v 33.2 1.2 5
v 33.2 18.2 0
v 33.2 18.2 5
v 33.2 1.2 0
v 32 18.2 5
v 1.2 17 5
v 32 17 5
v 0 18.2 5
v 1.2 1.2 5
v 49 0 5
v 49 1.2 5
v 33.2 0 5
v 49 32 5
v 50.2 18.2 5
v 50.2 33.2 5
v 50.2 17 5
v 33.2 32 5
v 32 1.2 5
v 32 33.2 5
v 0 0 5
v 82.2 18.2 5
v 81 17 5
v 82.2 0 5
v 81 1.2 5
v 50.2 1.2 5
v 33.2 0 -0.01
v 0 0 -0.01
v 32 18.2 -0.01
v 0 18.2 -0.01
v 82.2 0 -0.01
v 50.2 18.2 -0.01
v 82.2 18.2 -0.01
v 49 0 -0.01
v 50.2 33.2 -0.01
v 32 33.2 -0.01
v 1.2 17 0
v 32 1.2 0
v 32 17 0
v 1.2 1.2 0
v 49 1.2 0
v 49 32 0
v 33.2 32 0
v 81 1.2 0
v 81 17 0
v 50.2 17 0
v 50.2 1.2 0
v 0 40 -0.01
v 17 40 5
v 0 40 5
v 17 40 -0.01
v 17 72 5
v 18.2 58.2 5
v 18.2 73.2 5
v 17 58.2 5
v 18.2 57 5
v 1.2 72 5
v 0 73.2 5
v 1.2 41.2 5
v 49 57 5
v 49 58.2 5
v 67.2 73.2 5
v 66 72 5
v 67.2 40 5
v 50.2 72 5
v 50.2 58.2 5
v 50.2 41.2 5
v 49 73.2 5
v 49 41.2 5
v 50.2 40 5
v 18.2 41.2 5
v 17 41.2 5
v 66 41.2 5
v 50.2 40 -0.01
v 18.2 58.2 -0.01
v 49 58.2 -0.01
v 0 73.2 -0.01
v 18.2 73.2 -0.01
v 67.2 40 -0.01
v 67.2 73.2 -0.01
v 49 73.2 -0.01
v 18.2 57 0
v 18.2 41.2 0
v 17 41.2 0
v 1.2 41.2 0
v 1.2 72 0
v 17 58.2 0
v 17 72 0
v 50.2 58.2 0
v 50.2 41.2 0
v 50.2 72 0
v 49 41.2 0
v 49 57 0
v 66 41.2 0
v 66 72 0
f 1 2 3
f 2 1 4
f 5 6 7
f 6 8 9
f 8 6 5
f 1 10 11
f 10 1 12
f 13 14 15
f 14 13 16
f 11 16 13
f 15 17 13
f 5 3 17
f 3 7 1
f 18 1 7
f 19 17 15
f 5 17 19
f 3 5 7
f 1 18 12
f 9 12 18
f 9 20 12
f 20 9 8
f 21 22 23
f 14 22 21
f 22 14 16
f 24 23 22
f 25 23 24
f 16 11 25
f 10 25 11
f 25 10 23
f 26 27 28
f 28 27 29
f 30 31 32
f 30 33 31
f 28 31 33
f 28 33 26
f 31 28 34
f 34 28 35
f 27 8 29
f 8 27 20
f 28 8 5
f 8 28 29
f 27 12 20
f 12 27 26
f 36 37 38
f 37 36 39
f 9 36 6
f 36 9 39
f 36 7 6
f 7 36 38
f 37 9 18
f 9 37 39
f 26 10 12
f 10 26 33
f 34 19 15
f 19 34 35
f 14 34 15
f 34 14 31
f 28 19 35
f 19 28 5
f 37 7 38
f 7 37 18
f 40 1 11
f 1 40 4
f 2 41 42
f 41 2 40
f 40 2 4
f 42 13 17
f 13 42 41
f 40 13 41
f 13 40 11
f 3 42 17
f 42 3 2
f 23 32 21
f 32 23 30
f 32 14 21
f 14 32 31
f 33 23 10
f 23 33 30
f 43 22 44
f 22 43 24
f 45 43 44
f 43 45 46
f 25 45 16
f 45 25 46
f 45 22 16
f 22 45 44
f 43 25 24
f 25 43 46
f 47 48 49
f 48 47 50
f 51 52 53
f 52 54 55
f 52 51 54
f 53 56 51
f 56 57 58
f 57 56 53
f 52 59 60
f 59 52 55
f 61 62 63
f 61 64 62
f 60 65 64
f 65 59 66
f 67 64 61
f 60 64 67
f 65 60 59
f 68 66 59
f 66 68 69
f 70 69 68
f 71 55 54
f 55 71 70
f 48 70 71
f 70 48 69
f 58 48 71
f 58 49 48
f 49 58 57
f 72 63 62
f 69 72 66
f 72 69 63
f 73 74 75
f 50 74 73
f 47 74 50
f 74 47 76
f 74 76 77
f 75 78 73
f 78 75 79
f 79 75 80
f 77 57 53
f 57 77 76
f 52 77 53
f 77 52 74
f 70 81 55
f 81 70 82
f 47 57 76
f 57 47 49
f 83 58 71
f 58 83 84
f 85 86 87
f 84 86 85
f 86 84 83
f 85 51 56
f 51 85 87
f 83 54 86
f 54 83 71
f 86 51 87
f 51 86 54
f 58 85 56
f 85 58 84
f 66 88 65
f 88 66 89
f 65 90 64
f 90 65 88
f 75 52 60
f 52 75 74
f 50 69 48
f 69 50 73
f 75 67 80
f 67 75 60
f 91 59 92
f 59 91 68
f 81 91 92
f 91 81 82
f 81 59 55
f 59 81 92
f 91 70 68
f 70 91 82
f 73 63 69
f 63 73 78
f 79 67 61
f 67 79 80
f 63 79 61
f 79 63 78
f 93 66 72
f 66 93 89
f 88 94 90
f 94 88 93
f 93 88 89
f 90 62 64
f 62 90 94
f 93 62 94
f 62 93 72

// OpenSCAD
// file: ../../Base/Boxes.scad
// Fischertechnik Box Foundation
// Pre-designed Boxes

use <Constants.scad>

include <PlacementOptions.scad>

box190Width = 190;
box190Depth = 130;
box130Width = 130;
box130Depth = 95;
boxUsageHeight = 33.9;
boxWallThickness = 2.4;
boxBaseThickness = 1.0;

// getBoxWallThickness()
// Gets the wall thickness of a Fischertechnik Box

function getBoxWallThickness() = boxWallThickness;

// Gets the usable height of a fischertechnik box
function getBoxUsageHeight() = boxUsageHeight;

// Gets the thickness of the Fischertechnik box base.
function getBoxBaseThickness() = boxBaseThickness;

// Gets the usable inner space of a Box 190 as an x/y-list
function getBox190Space() = [
    box190Width - 2*getBoxWallThickness(), 
    box190Depth - 2*getBoxWallThickness() ];

// Imports the Fischertechnik empty box 130x190 mm and places it at position 0,0
// 190x130 are the outer sizes, the inner space is slightly smaller. Use getBox190Space() to get the inner sizes.
// This module needs the STL file "Fischertechnik Box 130x190.stl" in the library path.
// The box is positioned that the usable inner space is at the 0,0,0 position. The

module Box190() {
    translate([-getBoxWallThickness(),-getBoxWallThickness(),-getBoxBaseThickness()])
        import("Fischertechnik Box 130x190.stl", convexity=3);
}

// Gets the usable inner space of a Box 130 as an x/y-list
function getBox130Space() = [
    box130Width - 2*getBoxWallThickness(), 
    box130Depth - 2*getBoxWallThickness() ];

// Imports the Fischertechnik empty box 95x130 mm and places it at position 0,0
// 190x130 are the outer sizes, the inner space is slightly smaller. Use getBox190Space() to get the inner sizes.
// This module needs the STL file "Fischertechnik Box 95x130.stl" in the library path.
// The box is positioned that the usable inner space is at the 0,0,0 position. The

module Box130() {
    translate([-getBoxWallThickness(),-getBoxWallThickness(),-getBoxBaseThickness()])
        import("Fischertechnik Box 95x130.stl", convexity=3);
}

// Creates a web at the specified box walls
// corner 0 = LowerLeft, 1 = UpperLeft, 2 = UpperRight, 3 = LowerRight
// side 0 = LeftOfCorner, 1 = RightOfCorner
// distance = Distance in mm from the corner
// box = inner width and depth of the box (default: Box 190)
// webWidth = length of the web (default is 3 mms)
// webThickness = thickness of the web (default is 1 mm)

module BoxWeb(corner, side, distance, box=getBox190Space(), webWidth=3, webThickness=1.0) {
    sink = getBoxWallThickness()/2;

    width = (corner % 2 == 0) ? 
            (side == LeftOfCorner ? webWidth : webThickness) :
            (side == LeftOfCorner ? webThickness : webWidth);

    depth = (corner % 2 == 0) ? 
            (side == RightOfCorner ? webWidth : webThickness) :
            (side == RightOfCorner ? webThickness : webWidth);
    
    xDiff = corner == LowerLeft ? 
                (side == LeftOfCorner ? -sink : distance) :
            (corner == UpperLeft ?                
                (side == LeftOfCorner ? distance : -sink) :
            (corner == UpperRight ?
                (side == LeftOfCorner ? box.x-webWidth+sink : box.x-distance-webThickness) :
                (side == LeftOfCorner ? box.x-distance-webThickness: box.x-webWidth+sink)));

    yDiff = corner == LowerLeft ? 
                (side == RightOfCorner ? -sink : distance) :
            (corner == UpperLeft ?
                (side == RightOfCorner ? box.y-distance : box.y-webWidth+sink) :
            (corner == UpperRight ?
                (side == RightOfCorner ? box.y-webWidth+sink : box.y-distance) :
                (side == RightOfCorner ? distance : -sink)));
    
    translate([xDiff, yDiff, -getExcess()])
        cube([width, depth, boxUsageHeight + 2*getExcess()]);
}
// file: ../../Base/Alignment.scad
// Fischertechnik Box Foundation
// Geometry Helpers Alignment

include <PlacementOptions.scad>

// getAlignedX(elementWidth, spaceWidth, align=AlignRight, offset=0)
// Gets the aligned X offset of an element with the given
// width in the given space.
// elementWidth = The width of the element to positon
// spaceWidth = The space where the element should be aligned
// align = 0 AlignLeft, 1 AlignCenter, 2 AlignRight
// offset = an optional offset from the aligned position. When
// aligned left or centered, then positive values are in X direction.
// When aligned right then positive values are in negative X direction.

function getAlignedX(elementWidth, spaceWidth, align=AlignRight, offset=0) =
    (align == AlignLeft) ?
        offset :
        ((align == AlignCenter) ?
        (spaceWidth - elementWidth)/2 + offset :
        spaceWidth - offset - elementWidth);

// getAlignedY(elementDepth, spaceDepth, align=AlignTop, offset=0)
// Gets the aligned Y offset of an element with the given
// depth in the given space.
// elementDepth = The depth of the element to positon
// spaceDepth = The space where the element should be aligned
// align = 0 AlignBottom, 1 AlignCenter, 2 AlignTop
// offset = an optional offset from the aligned position. When
// aligned bottom or centered, then positive values are in Y direction.
// When aligned top then positive values are in negative Y direction.

function getAlignedY(elementDepth, spaceDepth, align=AlignTop, offset=0) =
    (align == AlignBottom) ?
        offset :
        ((align == AlignCenter) ?
        (spaceDepth - elementDepth)/2 + offset :
        spaceDepth - offset - elementDepth);
// file: ../../Base/Rotation.scad
// Fischertechnik Box Foundation
// Geometry Helpers Rotation

include <PlacementOptions.scad>

// getRotatedSpace(space, rotation=NoRotation)
// Rotates the space dependent on the specified rotation

function getRotatedSpace(space, rotation=NoRotation) = [
    (rotation == Rotate90 || rotation == Rotate270) ? space.y : space.x,
    (rotation == Rotate90 || rotation == Rotate270) ? space.x : space.y
];

// Rotates the given space around the fixed left lower corner
// space = the space the children needs as width/depth list [width,depth]
// rotation = 0 Rotate0 degrees, 1 Rotate90 degrees, 2 Rotate180 degrees, 3 Rotate270 degrees (equivalent to -90)

module RotateFix(space, rotation=Rotate0) {
    dy = (rotation == Rotate0 || rotation == Rotate270) ? 0 :
        (rotation == Rotate90) ? space.x :
        space.y;
    dx = (rotation < Rotate180) ? 0 :
        (rotation == Rotate180) ? space.x :
        space.y;
    
    translate([dx, dy, 0])
        rotate([0, 0, rotations[rotation]])
            children();
}
// file: ../../Base/Placement.scad
// Fischertechnik Box Foundation
// Geometry Helpers Placement

use <Constants.scad>
use <Alignment.scad>
use <Rotation.scad>
use <Boxes.scad>

include <PlacementOptions.scad>

// Place(x=0, y=0, elementSpace=[0,0], alignX=AlignLeft, alignY=AlignBottom, rotation=Rotate0, boxSpace=getBox190Space())
// Places the child at the specified position
// y = Y-Position. This is a relative position when an X aligment is specified.
// x = X-Position. This is a relative position when an Y aligment is specified.
// elementSpace = space of the element to be placed [x,y]
// alignX = -1=NoAlign, 0 AlignLeft, 1 AlignCenter, 3 AlignRight (elementSpace and boxSpace required!)
// alignY = -1=NoAlign, 2 AlignBottom, 1 AlignCenter, 4 AlignTop (elementSpace and boxSpace required!)
// rotation = 0 Rotate0 0 degrees, 1 Rotate90 90 degrees, 
// 2 Rotate180 180 degrees, 3 Rotate270 270 degrees (equivalent to -90)
// boxSpace = Inner space of the box where the placement occurs [x,y] - default is Box 190x130 inner space

module Place(x=0, y=0, elementSpace=[0,0], 
  alignX=AlignLeft, alignY=AlignBottom, 
  rotation=NoRotation, boxSpace=getBox190Space()) {

    module Position(x, y, space, rotation=Rotate0) {
        translate([x, y, 0])
            RotateFix(space, rotation)
                children(0);
    }

    space = getRotatedSpace(elementSpace, rotation);
    alignedX = getAlignedX(space.x, boxSpace.x, alignX, x);
    alignedY = getAlignedY(space.y, boxSpace.y, alignY, y);
    Position(alignedX, alignedY, elementSpace, rotation)
        children(0);
}

// Center(space=getBox130Space(), elementSpace=[0,0])
// space = Space where the children is centered. For cylinder use centered=true and no elementSpace.
// elementSpace = space of the element to be centered [x,y]

module Center(space=getBox190Space(), elementSpace=[0,0]) {
    translate([(space.x - elementSpace.x) / 2, (space.y - elementSpace.y) / 2])
        children(0);
}

// CenterHorizontal(width=0, y=0, offset=0, space=getBox130Space())
// space = Space where the children is centered. For cylinder use centered=true and no elementSpace.
// elementSpace = space of the element to be centered [x,y]

module CenterHorizontal(width=0, y=0, offset=0, space=getBox190Space()) {
    translate([(space.x - width) / 2 + offset, y])
        children(0);
}

// CenterVertical(depth=0, x=0, offset=0, space=getBox130Space())
// space = Space where the children is centered. For cylinder use centered=true and no elementSpace.
// elementSpace = space of the element to be centered [x,y]

module CenterVerticalal(depth=0, x=0, offset=0, space=getBox190Space()) {
    translate([x, (space.y - depth) / 2 + offset])
        children(0);
}
// file: ../../Base/Constants.scad
// Fischertechnik Box Foundation
// Constants

// Constant values necessary for multiple elements

// Base constants
dividerThickness = 1.2;
excess = 0.01;
fragments = 90;
tolerance = 0.8;

// Gets the thickness of a divider 
function getDividerThickness() = dividerThickness;

// Gets the excess that is used to merge walls into each other
function getExcess() = excess;

// Gets amount of fragments of a cylinder
function getFragments() = fragments;

// Gets the inner tolerance of a frame to each side
function getTolerance() = tolerance;


// Fischertechnik specific constants
axisDiameter = 4;
axisBottomDiameter = axisDiameter + 1;
standardEdgeDistance = 2.5;
standardWebDistance = 11.5;
standardCornerLength = 15;
tubeWallFactor = 1.6;

// Gets axis diameter
function getAxisDiameter() = axisDiameter;

// Gets axis bottom diameter for thicker part at the bottom
function getAxisBottomDiameter() = axisBottomDiameter;

// gets the standard distance to the wall of the box for dockable frames with webs
function getStandardEdgeDistance() = standardEdgeDistance;

// gets the standard distance of each web to the corner of the dockable frame
function getStandardWebDistance() = standardWebDistance;

// gets the standard length of the corner walls of a dockable frame
function getStandardCornerLength() = standardCornerLength;

// gets the wall thickness of a tube.
function getTubeWallThickness() = tubeWallFactor * getDividerThickness();
// file: ../../Base/PlacementOptions.scad
// Fischertechnik Box Foundation
// Placement Options

// Alignment
NoAlign = 0;
AlignLeft = 1;
AlignBottom = 2;
AlignCenter = 3;
AlignRight = 4;
AlignTop = 5;

// Element rotation degree steps
rotations = [0, -90, -180, -270];

// Rotation
NoRotation = 0;
Rotate0 = 0;
Rotate90 = 1;
Rotate180 = 2;
Rotate270 = 3;

// Docking (seen from above)
NoDock = -1;
DockLeft = 0;
DockTop = 1;
DockRight = 2;
DockCorner = 2;
DockBottom = 3;

// Web corners
LowerLeft = 0;
UpperLeft = 1;
UpperRight = 2;
LowerRight = 3;

// Web position relative to corner
LeftOfCorner = 0;
RightOfCorner = 1;
// file: ../../Base/Deployment.scad
// Fischertechnik Box Foundation
// Geometry Helpers Deployment

use <Constants.scad>
use <Placement.scad>
use <Rotation.scad>

include <PlacementOptions.scad>

// getWidth(spaces, rotations, count, i=0)
// Gets the sum of the width of count specified spaces, including rotations for each space.
// spaces = List of spaces from which the width should be added. Used internally for DeployRow.
// rotations = specify rotations for each space to get its correct width
// count = The count of spaces from the specified spaces that should be included in the sum (for recursive call)
// i = The space index offset used to start to add (for recursive call)

function getWidth(spaces, rotations, count, i=0) = 
    (i < count) ? 
        getRotatedSpace(spaces[i], rotations[i]).x + getWidth(spaces, rotations, count, i+1) : 
        0;

// getX(spaces, rotations, distance, i)
// Calculates the X position of the space with the index i, when the spaces are placed with the given
// equal distances. Used internally for DeployRow.
// spaces = List of spaces from which the width should be added
// rotations = specify rotations for each space to get its correct width
// distance = Equal distance between each space
// i = Index of the space to get its X position for

function getX(spaces, rotations, distance, i) = 
    (i == 0) ? 
        0 :
        (getRotatedSpace(spaces[i-1], rotations[i-1]).x + distance + getX(spaces, rotations, distance, i-1));

// DeployRow(width, spaces, rotations)
// Deploys the elements in the specified width with equal distances.
// rowWidth = The width of the row in mm.
// spaces = The spaces of all elements to deploy.
// rotations = The rotations of each element: 0 Rotate0 0 degrees, 1 Rotate90 90 degrees, 
// 2 Rotate180 180 degrees, 3 Rotate270 270 degrees (equivalent to -90).

module DeployRow(rowWidth, spaces, rotations) {
    distance = (rowWidth - getWidth(spaces, rotations, len(spaces))) / (len(spaces)-1);
    
    for (i = [0:1:$children-1]) {
        x = getX(spaces, rotations, distance, i);
        translate([x, 0])
            RotateFix(spaces[i], rotations[i])
                children(i);
    }
}

// DeploySame(space, elementSpace, columns=2, rows=1, rotation=Rotate0)
// Deploys columns and rows of the specified child in the specified space with
// equal distances
// space = The space where the element copies are deployed
// elementSpace = The space the child needs
// columns = Count of elements per row
// rows = Count of rows deployed
// rotation = The rotation of the child that will be applied

module DeploySame(space, elementSpace, columns=2, rows=1, rotation=Rotate0) {
    
    elementWidth = getRotatedSpace(elementSpace, rotation).x;
    columnDistance = (space.x - columns * elementWidth) / (columns > 1 ? columns - 1 : 1);
    endColumnOffset = space.x - elementWidth;
    columnOffsetStep = elementWidth + columnDistance;
    
    elementDepth = getRotatedSpace(elementSpace, rotation).y;
    rowDistance = (space.y - rows * elementDepth) / (rows > 1 ? rows - 1 : 1);
    endRowOffset = space.y - elementDepth;
    rowOffsetStep = elementDepth + rowDistance;
    
    for (rowOffset = [0:rowOffsetStep:endRowOffset]) {
        for (columnOffset = [0:columnOffsetStep:endColumnOffset]) {
            translate([columnOffset, rowOffset])
                RotateFix(elementSpace, rotation)
                    children(0);
        }
    }
}

// getMergedRowWidth(spaces, rotations, count, i=0)
// Gets the width of the merged spaces with the specified rotations.
// Merging works all elements with two frame walls. 
// The right and left walls are merged into one single wall.
// spaces = List of spaces from which the width should be added.
// rotations = specify rotations for each space to get its correct width
// count = The count of spaces from the specified spaces that should be included in the sum (for recursive call)
// i = The space index offset used to start to add (for recursive call)

function getMergedRowWidth(spaces, rotations, count, i=0) =
    (i < count) ? 
        getRotatedSpace(spaces[i], rotations[i]).x + getWidth(spaces, rotations, count, i+1) - (i > 0 ? getDividerThickness() : 0) : 
        0;

// MergeRow(spaces, rotations, dividerThickness=0.8)
// Deploys the children so that all walls of the neighbors are merged in a single common wall.
// spaces = List of spaces of the children to get the sizes from.
// rotations = specify rotations for each space to get its correct width
// dividerThickness = Thickness of all dividers of the elements (default is 0.8)

module MergeRow(spaces, rotations, dividerThickness = getDividerThickness()) {
    for (i = [0:1:$children-1]) {
        x = getX(spaces, rotations, -getDividerThickness(), i);
        translate([x, 0, 0])
            RotateFix(spaces[i], rotations[i])
                children(i);
    }
}

// Merge(count, space, rotation, dividerThickness=0.8)
// Deploys the child count times so that all walls of the neighbors are merged in a single common wall.
// space = Space of the child to get the sizes from.
// rotation = rotation of the child to get the correct width
// dividerThickness = Thickness of all dividers of the element (default is 0.8)

module Merge(count, space, rotation, dividerThickness = getDividerThickness()) {
    x = getRotatedSpace(space, rotation).x - getDividerThickness();
    for (offset = [0:x:(count-1)*x]) {
        echo(offset);
        translate([offset, 0, 0])
            RotateFix(space, rotation)
                children(0);
    }
}
// main file
// Fischertechnik Box Foundation
// Geometry Helpers Deployment
// Test MergeRow

use <../../Base/Deployment.scad>
use <../../ModelBase/Simple.scad>

include <../../Base/PlacementOptions.scad>

space = [30, 15, 5];
volume = getFrameOuterVolume(space);

MergeRow(
    [volume, volume, volume],
    [NoRotation, Rotate90, NoRotation]) {
    Frame(space);
    Frame(space);
    Frame(space);
}

translate([0, 40])
MergeRow(
    [volume, volume, volume],
    [Rotate90, NoRotation, Rotate90]) {
    Frame(space);
    Frame(space);
    Frame(space);
}
